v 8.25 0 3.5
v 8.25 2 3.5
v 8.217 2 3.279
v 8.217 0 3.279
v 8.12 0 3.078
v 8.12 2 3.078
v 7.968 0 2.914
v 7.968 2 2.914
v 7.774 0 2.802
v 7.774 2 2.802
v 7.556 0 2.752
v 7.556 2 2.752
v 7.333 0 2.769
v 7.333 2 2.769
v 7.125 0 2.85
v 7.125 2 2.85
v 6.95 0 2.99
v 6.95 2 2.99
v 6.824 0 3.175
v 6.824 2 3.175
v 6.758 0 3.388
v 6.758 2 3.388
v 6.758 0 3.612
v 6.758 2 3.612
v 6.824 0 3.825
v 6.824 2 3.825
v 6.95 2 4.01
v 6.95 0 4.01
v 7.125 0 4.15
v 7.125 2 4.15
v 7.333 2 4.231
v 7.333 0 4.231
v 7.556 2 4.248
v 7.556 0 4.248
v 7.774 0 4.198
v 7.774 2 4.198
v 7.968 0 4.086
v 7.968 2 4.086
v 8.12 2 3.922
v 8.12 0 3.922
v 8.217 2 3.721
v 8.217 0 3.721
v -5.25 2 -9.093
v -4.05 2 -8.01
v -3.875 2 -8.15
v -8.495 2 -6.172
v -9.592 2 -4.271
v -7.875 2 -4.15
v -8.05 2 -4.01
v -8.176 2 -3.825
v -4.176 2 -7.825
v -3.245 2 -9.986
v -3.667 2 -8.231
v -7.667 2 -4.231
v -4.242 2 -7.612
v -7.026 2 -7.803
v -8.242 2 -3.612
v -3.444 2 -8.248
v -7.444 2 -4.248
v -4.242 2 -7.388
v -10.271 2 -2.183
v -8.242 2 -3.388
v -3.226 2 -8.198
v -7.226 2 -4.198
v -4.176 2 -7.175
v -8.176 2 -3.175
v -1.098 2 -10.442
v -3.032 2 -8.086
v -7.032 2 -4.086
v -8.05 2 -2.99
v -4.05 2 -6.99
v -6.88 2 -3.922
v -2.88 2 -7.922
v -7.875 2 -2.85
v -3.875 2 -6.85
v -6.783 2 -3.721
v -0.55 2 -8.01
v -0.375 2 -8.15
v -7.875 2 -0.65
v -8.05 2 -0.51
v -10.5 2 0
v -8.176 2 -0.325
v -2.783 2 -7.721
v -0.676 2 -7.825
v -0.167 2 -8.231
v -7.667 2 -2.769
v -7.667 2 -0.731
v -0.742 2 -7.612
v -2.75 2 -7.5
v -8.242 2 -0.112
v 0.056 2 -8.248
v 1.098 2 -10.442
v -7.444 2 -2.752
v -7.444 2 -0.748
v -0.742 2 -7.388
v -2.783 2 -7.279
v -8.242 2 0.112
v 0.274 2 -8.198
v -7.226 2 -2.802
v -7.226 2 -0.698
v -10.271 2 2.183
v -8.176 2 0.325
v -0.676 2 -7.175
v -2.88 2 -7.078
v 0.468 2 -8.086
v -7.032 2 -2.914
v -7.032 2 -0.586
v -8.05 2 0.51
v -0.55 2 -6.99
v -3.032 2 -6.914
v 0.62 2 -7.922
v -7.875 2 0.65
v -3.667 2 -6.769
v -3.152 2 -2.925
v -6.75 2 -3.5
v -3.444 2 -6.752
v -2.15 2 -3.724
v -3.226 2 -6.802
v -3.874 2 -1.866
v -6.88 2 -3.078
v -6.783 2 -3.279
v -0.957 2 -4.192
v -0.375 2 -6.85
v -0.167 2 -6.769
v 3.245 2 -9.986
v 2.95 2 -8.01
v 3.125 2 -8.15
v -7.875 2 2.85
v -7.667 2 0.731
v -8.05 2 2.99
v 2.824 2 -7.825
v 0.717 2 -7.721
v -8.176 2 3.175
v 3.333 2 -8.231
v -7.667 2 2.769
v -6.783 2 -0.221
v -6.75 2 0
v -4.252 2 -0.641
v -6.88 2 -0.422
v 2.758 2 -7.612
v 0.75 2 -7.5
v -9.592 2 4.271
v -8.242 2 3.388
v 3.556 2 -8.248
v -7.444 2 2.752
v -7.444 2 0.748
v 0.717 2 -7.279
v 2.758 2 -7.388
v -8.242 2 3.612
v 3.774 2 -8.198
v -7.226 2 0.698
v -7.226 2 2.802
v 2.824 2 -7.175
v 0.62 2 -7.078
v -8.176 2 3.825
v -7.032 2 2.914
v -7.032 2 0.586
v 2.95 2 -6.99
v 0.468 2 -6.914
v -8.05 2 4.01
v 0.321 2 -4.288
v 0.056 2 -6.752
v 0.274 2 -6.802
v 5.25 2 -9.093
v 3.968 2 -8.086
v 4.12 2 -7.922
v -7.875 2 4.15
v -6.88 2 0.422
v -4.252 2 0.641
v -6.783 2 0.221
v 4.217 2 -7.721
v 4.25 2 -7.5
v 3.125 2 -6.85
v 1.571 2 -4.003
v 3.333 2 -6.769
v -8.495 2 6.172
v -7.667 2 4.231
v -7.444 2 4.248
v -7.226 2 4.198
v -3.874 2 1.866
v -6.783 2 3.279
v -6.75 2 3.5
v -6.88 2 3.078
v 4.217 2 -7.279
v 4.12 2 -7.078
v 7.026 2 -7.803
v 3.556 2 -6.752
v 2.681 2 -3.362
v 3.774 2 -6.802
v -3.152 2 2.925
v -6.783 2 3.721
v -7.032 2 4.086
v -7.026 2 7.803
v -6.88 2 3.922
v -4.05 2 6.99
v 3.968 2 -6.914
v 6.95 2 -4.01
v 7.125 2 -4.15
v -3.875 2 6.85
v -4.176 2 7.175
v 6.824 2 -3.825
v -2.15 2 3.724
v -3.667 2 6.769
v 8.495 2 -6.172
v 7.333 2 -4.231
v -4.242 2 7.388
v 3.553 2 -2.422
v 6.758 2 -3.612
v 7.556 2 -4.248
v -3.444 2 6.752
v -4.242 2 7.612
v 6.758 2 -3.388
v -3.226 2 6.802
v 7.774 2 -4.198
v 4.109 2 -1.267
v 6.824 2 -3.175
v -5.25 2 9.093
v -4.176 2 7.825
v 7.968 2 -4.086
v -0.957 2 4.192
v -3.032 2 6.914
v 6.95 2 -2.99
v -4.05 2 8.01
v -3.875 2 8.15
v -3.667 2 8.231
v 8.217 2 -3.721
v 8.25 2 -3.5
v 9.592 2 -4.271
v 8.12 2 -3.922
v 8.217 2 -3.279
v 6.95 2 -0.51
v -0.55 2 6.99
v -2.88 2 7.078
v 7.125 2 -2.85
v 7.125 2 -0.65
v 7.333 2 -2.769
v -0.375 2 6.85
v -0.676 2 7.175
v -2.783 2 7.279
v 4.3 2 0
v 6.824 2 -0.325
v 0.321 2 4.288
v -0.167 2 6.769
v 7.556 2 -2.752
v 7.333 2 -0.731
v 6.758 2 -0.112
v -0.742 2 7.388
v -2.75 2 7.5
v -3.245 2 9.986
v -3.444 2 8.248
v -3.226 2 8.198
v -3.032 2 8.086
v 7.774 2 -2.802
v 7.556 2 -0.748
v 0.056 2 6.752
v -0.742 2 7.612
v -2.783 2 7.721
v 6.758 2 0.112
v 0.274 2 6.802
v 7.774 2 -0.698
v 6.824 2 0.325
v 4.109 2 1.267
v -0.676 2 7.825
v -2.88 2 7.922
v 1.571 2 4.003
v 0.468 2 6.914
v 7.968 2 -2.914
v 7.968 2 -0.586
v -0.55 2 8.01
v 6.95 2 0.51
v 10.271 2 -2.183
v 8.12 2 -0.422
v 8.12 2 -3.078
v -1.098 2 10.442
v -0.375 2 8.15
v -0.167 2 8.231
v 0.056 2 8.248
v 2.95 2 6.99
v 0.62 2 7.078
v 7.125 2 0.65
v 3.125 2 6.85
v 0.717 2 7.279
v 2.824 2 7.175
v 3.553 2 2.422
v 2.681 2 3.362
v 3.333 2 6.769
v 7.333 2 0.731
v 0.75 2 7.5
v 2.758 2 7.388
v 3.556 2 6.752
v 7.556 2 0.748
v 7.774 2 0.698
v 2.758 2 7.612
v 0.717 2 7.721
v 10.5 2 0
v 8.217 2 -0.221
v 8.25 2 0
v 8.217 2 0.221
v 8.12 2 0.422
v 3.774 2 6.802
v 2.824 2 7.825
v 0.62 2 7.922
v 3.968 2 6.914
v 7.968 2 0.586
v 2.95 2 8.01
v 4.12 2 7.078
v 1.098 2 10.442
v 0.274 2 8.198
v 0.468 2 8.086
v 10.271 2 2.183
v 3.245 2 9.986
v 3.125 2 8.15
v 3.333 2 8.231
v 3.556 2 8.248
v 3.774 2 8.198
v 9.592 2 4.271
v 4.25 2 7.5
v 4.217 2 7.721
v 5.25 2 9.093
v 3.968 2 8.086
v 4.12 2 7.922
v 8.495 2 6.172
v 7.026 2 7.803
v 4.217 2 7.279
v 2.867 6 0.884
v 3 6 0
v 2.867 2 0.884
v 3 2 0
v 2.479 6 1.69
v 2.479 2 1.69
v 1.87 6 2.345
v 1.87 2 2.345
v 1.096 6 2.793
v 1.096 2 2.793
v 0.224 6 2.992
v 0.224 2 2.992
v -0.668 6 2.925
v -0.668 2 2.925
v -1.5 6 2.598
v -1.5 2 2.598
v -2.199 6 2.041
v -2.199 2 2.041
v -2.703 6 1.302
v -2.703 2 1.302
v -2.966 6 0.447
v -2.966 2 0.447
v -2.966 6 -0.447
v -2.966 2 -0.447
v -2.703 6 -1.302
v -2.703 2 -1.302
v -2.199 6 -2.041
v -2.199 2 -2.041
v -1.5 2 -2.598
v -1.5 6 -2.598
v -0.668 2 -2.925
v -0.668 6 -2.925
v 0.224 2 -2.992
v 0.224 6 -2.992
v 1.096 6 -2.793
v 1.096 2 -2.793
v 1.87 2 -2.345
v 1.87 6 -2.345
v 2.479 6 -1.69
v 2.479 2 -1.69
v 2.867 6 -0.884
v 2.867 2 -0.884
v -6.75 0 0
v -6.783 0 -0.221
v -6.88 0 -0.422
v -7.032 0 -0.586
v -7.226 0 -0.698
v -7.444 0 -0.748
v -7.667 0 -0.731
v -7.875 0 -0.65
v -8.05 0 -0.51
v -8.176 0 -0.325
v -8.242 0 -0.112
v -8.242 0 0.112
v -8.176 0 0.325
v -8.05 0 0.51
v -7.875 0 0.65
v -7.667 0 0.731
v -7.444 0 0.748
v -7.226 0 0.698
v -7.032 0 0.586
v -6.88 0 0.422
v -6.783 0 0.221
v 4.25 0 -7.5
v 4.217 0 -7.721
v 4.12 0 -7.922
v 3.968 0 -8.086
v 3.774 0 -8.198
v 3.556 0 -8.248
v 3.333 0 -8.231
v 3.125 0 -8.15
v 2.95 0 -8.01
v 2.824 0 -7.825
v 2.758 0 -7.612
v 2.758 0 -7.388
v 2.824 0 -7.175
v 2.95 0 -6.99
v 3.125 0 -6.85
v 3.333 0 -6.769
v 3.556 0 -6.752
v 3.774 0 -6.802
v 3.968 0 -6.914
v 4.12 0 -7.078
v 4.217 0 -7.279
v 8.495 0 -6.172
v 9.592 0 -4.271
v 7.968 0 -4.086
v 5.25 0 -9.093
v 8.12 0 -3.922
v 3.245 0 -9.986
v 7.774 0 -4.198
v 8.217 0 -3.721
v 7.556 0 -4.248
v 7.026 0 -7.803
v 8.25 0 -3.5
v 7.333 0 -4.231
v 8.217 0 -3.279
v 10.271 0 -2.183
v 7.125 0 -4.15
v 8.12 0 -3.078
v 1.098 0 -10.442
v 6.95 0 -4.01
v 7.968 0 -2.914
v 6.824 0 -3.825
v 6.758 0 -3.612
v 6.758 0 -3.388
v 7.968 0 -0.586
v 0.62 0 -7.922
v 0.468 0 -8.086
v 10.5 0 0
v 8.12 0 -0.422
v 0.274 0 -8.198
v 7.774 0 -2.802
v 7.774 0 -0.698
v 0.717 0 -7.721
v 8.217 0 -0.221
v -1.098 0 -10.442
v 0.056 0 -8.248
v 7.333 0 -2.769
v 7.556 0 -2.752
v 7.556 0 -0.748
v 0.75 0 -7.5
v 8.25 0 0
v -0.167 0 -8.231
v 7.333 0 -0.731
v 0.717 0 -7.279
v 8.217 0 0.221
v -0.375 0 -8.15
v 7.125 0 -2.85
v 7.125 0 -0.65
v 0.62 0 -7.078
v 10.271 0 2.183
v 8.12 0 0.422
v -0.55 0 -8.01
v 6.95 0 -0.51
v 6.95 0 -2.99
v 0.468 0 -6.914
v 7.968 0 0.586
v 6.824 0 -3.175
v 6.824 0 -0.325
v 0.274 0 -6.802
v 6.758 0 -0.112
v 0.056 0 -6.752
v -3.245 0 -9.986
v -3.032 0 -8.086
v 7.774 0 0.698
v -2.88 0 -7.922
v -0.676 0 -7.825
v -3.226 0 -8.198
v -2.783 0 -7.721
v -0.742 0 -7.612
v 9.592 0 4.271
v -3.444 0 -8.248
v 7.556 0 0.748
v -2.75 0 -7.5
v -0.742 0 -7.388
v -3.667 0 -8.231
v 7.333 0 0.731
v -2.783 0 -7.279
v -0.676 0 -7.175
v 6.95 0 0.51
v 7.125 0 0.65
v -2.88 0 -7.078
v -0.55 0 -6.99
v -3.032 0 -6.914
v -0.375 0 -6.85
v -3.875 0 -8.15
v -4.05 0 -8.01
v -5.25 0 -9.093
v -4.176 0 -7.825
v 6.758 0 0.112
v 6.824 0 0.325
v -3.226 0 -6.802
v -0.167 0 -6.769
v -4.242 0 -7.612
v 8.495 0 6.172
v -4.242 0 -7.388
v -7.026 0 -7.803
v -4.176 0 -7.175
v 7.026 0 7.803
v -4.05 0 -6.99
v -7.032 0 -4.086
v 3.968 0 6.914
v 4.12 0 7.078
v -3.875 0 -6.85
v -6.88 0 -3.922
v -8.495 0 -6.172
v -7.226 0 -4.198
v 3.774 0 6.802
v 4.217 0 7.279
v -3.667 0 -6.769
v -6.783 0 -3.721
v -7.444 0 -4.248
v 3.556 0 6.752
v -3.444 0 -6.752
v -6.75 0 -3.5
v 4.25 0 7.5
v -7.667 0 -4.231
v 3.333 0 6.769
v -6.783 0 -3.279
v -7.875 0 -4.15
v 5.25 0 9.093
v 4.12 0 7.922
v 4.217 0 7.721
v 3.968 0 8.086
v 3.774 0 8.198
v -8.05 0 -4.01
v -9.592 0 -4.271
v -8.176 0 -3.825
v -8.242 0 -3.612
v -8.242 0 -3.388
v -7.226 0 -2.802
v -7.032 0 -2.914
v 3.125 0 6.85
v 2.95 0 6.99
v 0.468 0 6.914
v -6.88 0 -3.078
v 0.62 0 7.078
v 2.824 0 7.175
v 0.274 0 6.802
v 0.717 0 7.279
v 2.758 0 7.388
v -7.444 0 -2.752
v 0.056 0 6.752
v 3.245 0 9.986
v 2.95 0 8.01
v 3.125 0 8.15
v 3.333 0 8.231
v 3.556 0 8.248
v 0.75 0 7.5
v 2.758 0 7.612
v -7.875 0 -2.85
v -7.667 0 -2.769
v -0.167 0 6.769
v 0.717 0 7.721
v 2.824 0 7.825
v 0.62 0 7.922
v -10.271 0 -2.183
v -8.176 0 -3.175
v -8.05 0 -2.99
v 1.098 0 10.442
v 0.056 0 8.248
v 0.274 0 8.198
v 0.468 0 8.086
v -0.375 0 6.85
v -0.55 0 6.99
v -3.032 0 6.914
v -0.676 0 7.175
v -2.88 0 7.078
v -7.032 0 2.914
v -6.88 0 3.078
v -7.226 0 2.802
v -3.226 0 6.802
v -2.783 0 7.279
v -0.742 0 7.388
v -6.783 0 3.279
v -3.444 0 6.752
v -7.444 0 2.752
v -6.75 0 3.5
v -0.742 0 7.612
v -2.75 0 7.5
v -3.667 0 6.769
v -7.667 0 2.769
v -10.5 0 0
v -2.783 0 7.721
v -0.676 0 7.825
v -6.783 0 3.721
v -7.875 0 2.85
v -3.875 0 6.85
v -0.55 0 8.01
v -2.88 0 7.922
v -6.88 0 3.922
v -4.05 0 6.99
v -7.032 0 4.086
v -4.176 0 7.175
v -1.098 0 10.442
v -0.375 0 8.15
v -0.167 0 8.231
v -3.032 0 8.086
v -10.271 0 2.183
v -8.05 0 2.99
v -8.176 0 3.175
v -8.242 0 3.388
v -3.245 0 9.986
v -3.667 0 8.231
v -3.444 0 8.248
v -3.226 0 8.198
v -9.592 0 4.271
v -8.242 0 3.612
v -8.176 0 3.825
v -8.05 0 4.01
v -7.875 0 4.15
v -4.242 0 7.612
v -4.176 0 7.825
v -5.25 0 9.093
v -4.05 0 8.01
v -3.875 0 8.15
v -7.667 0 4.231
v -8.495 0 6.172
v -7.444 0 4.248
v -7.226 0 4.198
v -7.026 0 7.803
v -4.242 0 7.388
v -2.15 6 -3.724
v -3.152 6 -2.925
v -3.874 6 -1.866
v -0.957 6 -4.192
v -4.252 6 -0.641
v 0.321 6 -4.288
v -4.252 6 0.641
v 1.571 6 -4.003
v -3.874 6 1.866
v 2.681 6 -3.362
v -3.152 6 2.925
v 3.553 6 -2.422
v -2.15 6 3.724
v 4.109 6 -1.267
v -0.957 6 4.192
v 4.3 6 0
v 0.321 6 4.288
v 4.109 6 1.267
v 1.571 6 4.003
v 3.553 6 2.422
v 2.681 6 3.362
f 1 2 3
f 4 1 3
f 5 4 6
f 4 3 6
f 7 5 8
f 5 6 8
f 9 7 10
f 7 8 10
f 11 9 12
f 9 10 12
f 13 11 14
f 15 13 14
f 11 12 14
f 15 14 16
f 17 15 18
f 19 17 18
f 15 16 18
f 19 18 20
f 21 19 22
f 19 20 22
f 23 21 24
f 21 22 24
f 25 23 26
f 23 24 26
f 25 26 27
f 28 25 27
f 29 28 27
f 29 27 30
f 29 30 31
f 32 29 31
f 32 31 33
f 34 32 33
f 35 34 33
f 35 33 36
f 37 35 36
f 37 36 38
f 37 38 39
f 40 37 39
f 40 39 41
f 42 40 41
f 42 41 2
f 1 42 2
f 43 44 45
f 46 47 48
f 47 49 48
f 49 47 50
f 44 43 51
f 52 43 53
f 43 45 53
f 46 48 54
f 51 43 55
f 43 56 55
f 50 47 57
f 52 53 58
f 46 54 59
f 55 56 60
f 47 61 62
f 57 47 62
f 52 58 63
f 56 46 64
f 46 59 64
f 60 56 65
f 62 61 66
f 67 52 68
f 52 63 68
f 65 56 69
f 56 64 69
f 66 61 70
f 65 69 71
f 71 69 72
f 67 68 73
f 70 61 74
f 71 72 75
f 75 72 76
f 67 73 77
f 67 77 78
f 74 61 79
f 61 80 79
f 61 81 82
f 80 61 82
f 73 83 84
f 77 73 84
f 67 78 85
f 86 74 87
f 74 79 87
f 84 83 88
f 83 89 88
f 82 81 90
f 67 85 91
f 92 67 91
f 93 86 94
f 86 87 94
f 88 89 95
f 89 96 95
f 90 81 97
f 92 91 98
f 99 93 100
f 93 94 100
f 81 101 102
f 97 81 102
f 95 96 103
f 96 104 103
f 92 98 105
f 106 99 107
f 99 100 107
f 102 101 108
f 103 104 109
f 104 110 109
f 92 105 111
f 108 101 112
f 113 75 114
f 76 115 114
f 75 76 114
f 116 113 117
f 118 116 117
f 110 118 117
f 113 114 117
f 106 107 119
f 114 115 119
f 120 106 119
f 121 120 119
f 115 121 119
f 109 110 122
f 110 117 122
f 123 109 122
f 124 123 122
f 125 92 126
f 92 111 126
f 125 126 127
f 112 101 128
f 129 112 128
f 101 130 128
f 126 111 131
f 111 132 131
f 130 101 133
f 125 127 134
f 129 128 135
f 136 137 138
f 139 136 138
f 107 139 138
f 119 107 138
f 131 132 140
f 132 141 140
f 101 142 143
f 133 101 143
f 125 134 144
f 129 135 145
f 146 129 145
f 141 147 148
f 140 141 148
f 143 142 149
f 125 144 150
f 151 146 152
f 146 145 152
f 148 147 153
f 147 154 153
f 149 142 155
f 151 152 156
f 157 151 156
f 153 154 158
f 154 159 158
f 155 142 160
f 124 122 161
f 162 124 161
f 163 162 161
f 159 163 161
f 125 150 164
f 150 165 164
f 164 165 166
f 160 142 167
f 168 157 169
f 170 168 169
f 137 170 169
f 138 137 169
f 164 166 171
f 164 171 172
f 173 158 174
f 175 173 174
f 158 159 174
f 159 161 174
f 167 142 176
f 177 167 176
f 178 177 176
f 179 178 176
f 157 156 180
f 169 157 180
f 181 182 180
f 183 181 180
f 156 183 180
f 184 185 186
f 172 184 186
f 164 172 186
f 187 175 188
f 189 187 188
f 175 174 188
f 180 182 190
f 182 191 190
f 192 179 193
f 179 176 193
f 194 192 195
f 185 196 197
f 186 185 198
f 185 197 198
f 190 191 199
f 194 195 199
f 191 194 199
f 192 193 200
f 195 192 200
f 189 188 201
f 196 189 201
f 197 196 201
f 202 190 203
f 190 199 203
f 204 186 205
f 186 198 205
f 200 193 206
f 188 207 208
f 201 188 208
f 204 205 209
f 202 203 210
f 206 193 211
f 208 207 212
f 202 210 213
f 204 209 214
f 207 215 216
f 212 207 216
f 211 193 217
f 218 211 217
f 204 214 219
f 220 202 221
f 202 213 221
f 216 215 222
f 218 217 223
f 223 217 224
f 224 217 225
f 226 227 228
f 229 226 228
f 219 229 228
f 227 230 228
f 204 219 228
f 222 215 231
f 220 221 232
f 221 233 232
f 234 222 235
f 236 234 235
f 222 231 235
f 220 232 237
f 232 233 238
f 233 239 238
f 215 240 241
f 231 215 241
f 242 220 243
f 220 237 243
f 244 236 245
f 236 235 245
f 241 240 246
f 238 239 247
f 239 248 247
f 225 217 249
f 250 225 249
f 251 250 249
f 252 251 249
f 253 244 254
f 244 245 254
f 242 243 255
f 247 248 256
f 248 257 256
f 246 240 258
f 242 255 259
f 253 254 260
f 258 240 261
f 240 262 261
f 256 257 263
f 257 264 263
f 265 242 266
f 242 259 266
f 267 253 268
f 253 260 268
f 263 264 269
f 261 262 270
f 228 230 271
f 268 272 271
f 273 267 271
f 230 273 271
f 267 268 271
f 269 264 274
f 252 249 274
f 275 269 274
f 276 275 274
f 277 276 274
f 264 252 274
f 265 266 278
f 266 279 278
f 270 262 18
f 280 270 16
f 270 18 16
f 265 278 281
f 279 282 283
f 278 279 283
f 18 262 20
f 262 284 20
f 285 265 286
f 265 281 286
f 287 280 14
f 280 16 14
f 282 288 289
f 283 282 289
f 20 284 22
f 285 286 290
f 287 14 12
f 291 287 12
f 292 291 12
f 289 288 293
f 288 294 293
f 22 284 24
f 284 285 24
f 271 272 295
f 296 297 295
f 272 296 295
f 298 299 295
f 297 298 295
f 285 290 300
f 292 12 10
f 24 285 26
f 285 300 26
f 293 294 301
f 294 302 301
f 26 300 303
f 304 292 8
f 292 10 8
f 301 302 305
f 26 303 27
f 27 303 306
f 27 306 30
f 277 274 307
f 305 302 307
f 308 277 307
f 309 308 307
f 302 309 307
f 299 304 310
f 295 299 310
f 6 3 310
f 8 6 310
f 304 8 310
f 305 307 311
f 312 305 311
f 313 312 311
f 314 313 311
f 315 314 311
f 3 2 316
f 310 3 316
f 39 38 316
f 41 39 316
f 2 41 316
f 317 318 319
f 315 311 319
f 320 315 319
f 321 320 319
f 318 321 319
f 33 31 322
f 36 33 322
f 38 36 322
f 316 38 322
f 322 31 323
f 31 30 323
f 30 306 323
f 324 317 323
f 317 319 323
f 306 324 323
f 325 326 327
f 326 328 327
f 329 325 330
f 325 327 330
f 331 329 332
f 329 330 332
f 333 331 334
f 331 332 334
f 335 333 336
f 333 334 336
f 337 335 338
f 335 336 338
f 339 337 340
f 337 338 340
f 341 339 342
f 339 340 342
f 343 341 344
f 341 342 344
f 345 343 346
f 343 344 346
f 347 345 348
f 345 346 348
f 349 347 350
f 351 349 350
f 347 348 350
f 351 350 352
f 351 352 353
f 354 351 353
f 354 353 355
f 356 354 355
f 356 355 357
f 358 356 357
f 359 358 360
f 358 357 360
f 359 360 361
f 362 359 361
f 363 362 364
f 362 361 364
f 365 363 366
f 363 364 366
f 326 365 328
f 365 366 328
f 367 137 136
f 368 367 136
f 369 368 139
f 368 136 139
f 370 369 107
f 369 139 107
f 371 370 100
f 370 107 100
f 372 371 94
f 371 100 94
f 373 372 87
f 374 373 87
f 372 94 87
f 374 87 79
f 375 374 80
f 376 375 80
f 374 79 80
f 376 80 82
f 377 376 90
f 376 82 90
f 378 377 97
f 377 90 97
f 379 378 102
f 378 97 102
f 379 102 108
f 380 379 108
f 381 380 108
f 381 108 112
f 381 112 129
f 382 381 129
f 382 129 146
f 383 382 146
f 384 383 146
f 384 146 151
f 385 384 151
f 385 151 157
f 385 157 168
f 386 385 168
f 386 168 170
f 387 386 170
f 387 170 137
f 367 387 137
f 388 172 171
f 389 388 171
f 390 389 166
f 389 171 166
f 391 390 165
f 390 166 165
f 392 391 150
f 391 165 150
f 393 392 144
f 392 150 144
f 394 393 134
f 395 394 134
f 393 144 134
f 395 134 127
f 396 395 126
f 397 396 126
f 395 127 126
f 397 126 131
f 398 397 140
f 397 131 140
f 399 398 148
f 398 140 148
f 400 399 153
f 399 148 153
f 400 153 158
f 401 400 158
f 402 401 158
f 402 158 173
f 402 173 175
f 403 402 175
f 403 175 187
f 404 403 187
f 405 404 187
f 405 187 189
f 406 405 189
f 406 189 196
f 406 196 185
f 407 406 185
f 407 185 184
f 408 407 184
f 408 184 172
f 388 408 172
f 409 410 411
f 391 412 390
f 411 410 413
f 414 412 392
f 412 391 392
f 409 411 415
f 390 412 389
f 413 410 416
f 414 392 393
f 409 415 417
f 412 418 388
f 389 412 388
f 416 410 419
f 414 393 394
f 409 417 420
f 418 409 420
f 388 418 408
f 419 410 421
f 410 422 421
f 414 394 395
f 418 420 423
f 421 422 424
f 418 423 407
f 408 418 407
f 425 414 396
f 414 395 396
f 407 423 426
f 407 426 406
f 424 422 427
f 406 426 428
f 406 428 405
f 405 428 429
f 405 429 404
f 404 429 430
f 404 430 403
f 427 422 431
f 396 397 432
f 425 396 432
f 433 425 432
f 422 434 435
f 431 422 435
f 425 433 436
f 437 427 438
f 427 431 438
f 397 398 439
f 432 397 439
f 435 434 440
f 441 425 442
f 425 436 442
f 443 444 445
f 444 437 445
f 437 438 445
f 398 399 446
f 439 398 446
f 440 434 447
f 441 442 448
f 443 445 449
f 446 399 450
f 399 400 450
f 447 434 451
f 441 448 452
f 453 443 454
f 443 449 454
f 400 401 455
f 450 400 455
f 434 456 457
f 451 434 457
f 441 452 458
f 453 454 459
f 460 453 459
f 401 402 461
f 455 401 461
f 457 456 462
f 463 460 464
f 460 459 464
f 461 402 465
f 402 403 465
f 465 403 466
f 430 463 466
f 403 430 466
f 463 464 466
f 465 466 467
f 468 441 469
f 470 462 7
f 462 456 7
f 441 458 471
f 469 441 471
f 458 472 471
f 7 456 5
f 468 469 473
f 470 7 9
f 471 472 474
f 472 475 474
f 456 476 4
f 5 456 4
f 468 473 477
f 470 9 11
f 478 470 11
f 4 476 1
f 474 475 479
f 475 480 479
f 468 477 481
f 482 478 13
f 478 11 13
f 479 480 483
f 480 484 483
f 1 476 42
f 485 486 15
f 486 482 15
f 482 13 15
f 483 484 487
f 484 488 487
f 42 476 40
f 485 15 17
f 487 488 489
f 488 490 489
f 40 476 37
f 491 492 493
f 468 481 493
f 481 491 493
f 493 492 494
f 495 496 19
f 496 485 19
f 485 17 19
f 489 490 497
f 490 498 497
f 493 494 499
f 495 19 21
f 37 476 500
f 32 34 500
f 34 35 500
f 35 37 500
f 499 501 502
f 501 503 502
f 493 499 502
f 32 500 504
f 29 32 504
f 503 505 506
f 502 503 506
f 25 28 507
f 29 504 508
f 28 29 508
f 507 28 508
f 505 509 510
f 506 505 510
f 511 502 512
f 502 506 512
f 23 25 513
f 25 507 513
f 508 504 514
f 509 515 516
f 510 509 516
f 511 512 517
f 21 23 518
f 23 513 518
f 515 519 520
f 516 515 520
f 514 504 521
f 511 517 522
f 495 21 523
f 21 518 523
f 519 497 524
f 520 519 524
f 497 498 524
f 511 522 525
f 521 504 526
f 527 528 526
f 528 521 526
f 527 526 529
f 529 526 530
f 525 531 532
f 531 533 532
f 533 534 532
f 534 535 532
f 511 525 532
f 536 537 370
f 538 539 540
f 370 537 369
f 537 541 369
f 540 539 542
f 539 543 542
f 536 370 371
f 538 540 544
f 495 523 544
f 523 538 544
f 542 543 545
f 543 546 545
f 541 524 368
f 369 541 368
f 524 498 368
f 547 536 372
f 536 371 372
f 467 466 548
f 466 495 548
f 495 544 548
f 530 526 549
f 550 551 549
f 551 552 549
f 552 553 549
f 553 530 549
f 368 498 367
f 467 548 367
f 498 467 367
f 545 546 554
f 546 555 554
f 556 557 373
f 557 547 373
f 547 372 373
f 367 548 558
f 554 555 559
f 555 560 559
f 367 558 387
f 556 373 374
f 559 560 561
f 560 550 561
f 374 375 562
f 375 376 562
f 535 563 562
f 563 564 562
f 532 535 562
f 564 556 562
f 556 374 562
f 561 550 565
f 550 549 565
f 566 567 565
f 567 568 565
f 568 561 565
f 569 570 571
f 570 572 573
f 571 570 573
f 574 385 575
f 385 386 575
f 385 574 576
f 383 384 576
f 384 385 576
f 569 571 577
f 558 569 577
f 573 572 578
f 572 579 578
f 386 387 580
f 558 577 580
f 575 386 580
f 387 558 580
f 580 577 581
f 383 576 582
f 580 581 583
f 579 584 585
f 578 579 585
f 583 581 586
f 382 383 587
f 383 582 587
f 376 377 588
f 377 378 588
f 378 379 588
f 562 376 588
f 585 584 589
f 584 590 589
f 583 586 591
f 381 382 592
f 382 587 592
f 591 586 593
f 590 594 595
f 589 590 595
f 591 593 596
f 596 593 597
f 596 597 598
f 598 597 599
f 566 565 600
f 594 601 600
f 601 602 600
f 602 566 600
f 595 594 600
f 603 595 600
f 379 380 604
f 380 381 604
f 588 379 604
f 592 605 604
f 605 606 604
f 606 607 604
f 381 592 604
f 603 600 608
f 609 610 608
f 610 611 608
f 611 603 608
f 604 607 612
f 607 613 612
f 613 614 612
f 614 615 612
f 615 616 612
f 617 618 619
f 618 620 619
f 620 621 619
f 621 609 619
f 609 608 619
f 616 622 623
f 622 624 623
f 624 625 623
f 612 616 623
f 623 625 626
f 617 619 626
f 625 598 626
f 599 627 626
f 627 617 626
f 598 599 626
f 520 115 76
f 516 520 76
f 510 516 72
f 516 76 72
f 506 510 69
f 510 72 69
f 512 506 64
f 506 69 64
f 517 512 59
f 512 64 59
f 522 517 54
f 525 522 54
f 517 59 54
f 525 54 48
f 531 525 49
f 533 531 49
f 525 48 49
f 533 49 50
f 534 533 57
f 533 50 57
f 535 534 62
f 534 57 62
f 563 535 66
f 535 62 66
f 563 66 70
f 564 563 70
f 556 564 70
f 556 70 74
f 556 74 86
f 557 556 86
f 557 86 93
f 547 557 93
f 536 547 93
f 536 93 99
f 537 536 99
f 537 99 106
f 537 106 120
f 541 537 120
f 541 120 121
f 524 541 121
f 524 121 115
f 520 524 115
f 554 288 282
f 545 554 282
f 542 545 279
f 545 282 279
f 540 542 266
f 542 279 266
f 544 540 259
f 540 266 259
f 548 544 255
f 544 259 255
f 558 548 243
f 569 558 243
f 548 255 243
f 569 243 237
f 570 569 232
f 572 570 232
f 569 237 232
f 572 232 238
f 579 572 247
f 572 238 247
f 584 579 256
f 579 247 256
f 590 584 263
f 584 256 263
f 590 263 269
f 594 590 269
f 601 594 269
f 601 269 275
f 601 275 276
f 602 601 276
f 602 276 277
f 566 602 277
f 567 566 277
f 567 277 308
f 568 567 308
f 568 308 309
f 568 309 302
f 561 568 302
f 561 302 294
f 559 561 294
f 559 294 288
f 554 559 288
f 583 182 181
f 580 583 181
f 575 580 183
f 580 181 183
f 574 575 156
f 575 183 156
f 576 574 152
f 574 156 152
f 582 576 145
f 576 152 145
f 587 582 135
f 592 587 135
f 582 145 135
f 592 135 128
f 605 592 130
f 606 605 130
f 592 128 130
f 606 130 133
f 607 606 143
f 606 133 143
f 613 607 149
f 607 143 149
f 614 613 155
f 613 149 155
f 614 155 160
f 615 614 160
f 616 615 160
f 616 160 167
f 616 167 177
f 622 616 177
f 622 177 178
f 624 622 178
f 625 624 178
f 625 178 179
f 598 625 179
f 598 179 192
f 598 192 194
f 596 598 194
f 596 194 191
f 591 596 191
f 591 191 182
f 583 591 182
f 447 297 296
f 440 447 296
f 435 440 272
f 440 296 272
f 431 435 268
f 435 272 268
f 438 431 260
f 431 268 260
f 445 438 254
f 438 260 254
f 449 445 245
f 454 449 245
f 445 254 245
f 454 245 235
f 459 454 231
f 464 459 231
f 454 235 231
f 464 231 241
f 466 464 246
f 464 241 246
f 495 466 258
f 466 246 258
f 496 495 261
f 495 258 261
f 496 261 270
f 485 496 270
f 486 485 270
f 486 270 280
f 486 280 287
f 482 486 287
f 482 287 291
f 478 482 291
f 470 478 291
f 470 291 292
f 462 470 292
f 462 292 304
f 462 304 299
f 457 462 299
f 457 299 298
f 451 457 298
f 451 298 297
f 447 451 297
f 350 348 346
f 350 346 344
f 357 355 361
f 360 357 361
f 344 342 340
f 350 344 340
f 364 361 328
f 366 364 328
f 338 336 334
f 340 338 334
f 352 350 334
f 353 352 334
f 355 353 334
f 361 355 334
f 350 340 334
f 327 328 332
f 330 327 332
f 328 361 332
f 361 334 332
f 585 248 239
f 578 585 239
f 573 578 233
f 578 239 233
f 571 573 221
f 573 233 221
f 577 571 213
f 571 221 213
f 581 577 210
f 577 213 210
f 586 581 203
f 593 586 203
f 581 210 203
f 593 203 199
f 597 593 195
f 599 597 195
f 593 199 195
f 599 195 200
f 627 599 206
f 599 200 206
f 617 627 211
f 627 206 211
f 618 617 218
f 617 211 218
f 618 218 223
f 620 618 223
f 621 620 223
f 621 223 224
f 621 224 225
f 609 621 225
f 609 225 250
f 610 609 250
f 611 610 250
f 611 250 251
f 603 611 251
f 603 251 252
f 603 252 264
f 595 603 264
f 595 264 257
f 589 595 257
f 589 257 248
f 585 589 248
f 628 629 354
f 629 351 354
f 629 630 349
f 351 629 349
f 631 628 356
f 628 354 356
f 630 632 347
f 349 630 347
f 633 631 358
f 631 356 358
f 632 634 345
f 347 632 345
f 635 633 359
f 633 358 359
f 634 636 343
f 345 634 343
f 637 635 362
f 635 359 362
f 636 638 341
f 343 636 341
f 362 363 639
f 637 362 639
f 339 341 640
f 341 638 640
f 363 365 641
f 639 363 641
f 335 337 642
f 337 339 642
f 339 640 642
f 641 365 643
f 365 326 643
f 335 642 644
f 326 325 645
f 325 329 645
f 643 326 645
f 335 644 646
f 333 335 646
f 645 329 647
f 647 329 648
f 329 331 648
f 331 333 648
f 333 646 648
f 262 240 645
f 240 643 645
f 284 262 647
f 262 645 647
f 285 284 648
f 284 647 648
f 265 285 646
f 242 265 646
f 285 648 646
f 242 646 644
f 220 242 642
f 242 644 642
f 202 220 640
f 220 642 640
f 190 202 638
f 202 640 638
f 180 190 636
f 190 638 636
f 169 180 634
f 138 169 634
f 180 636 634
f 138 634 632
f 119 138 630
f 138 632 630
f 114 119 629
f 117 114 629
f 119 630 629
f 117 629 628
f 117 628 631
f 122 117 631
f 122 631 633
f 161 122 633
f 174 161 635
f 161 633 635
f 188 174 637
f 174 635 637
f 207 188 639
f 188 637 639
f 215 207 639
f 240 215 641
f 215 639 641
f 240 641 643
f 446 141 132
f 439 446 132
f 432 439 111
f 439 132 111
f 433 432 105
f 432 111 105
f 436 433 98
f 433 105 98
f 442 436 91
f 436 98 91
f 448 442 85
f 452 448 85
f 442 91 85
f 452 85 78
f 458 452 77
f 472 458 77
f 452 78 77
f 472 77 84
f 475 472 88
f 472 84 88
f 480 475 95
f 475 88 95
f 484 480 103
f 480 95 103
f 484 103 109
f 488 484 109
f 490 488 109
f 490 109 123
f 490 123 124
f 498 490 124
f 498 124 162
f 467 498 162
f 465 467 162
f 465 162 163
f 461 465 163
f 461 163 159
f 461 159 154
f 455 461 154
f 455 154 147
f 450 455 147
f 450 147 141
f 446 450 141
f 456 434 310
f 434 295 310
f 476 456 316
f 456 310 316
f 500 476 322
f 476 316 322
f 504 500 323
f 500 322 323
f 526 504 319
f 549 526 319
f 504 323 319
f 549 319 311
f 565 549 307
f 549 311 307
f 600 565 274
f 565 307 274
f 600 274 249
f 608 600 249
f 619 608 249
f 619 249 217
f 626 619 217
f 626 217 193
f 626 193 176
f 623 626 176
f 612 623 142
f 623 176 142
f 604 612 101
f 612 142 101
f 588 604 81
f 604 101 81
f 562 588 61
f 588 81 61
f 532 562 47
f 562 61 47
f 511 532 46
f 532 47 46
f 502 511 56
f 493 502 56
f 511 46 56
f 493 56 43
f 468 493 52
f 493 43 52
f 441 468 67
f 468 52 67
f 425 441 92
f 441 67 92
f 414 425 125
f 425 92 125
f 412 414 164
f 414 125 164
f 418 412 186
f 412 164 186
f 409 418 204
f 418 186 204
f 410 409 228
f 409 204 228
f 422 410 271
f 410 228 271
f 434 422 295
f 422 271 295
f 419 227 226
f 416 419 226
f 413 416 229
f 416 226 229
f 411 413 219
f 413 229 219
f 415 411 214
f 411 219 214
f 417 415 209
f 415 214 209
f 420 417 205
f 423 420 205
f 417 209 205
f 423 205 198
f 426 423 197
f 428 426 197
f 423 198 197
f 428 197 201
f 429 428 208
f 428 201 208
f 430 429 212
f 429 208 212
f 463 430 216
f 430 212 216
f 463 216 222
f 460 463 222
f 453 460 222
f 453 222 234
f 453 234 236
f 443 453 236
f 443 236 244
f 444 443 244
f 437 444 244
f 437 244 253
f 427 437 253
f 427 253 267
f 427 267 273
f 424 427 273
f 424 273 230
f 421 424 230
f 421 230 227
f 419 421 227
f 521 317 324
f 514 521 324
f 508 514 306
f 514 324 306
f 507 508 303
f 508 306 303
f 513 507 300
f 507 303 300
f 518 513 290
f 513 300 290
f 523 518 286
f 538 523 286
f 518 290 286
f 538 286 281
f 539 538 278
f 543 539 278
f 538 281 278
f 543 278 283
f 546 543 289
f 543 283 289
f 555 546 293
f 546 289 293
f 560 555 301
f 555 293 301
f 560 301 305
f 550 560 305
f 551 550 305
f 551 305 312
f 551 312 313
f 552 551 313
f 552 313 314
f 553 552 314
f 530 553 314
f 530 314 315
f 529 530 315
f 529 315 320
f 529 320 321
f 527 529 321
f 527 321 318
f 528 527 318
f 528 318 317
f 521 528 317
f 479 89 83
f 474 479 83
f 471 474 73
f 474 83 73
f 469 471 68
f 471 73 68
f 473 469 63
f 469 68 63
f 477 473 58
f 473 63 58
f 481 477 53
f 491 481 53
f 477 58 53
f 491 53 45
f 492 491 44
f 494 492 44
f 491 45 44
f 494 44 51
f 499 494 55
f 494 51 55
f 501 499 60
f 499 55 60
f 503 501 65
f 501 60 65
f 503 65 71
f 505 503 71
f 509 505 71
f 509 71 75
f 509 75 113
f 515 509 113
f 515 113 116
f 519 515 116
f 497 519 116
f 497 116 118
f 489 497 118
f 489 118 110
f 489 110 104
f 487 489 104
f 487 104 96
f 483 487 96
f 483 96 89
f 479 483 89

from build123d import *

# Parameters (mm, degrees)
CUT_EXTRUDE_1_REACH = 4
SKETCH_2_R          = 0.75


with BuildPart() as part:
    # 草图1 → 旋转1 (revolve)
    with BuildSketch(Plane.XY):
        Polygon((0, 0), (10.5, 0), (10.5, 2), (4.3, 2), (4.3, 6), (3, 6), (3, 2), (0, 2), align=None)
    revolve(axis=Axis((0, 2, 0), (0, -1, 0)))

    # 草图2 → 切除-拉伸1 (cut, up to next)
    with BuildSketch(Plane(origin=(0, 2, 0), x_dir=(1, 0, 0), z_dir=(0, 1, 0)), mode=Mode.PRIVATE) as cut_extrude_1_sk1:
        with Locations((3.5, 7.5)):
            Circle(SKETCH_2_R)
    cut_extrude_1_tool1 = extrude(cut_extrude_1_sk1.sketch, amount=-CUT_EXTRUDE_1_REACH, mode=Mode.PRIVATE) & part.part
    add(cut_extrude_1_tool1.solids().sort_by_distance((3.5, 2, -7.5))[0], mode=Mode.SUBTRACT)
    # 草图2 → 切除-拉伸1 (cut, up to next)
    with BuildSketch(Plane(origin=(0, 2, 0), x_dir=(1, 0, 0), z_dir=(0, 1, 0)), mode=Mode.PRIVATE) as cut_extrude_1_sk2:
        with Locations((0, 7.5)):
            Circle(SKETCH_2_R)
    cut_extrude_1_tool2 = extrude(cut_extrude_1_sk2.sketch, amount=-CUT_EXTRUDE_1_REACH, mode=Mode.PRIVATE) & part.part
    add(cut_extrude_1_tool2.solids().sort_by_distance((0, 2, -7.5))[0], mode=Mode.SUBTRACT)
    # 草图2 → 切除-拉伸1 (cut, up to next)
    with BuildSketch(Plane(origin=(0, 2, 0), x_dir=(1, 0, 0), z_dir=(0, 1, 0)), mode=Mode.PRIVATE) as cut_extrude_1_sk3:
        with Locations((-3.5, 7.5)):
            Circle(SKETCH_2_R)
    cut_extrude_1_tool3 = extrude(cut_extrude_1_sk3.sketch, amount=-CUT_EXTRUDE_1_REACH, mode=Mode.PRIVATE) & part.part
    add(cut_extrude_1_tool3.solids().sort_by_distance((-3.5, 2, -7.5))[0], mode=Mode.SUBTRACT)
    # 草图2 → 切除-拉伸1 (cut, up to next)
    with BuildSketch(Plane(origin=(0, 2, 0), x_dir=(1, 0, 0), z_dir=(0, 1, 0)), mode=Mode.PRIVATE) as cut_extrude_1_sk4:
        with Locations((7.5, 3.5)):
            Circle(SKETCH_2_R)
    cut_extrude_1_tool4 = extrude(cut_extrude_1_sk4.sketch, amount=-CUT_EXTRUDE_1_REACH, mode=Mode.PRIVATE) & part.part
    add(cut_extrude_1_tool4.solids().sort_by_distance((7.5, 2, -3.5))[0], mode=Mode.SUBTRACT)
    # 草图2 → 切除-拉伸1 (cut, up to next)
    with BuildSketch(Plane(origin=(0, 2, 0), x_dir=(1, 0, 0), z_dir=(0, 1, 0)), mode=Mode.PRIVATE) as cut_extrude_1_sk5:
        with Locations((7.5, -3.5)):
            Circle(SKETCH_2_R)
    cut_extrude_1_tool5 = extrude(cut_extrude_1_sk5.sketch, amount=-CUT_EXTRUDE_1_REACH, mode=Mode.PRIVATE) & part.part
    add(cut_extrude_1_tool5.solids().sort_by_distance((7.5, 2, 3.5))[0], mode=Mode.SUBTRACT)
    # 草图2 → 切除-拉伸1 (cut, up to next)
    with BuildSketch(Plane(origin=(0, 2, 0), x_dir=(1, 0, 0), z_dir=(0, 1, 0)), mode=Mode.PRIVATE) as cut_extrude_1_sk6:
        with Locations((7.5, 0)):
            Circle(SKETCH_2_R)
    cut_extrude_1_tool6 = extrude(cut_extrude_1_sk6.sketch, amount=-CUT_EXTRUDE_1_REACH, mode=Mode.PRIVATE) & part.part
    add(cut_extrude_1_tool6.solids().sort_by_distance((7.5, 2, 0))[0], mode=Mode.SUBTRACT)
    # 草图2 → 切除-拉伸1 (cut, up to next)
    with BuildSketch(Plane(origin=(0, 2, 0), x_dir=(1, 0, 0), z_dir=(0, 1, 0)), mode=Mode.PRIVATE) as cut_extrude_1_sk7:
        with Locations((3.5, -7.5)):
            Circle(SKETCH_2_R)
    cut_extrude_1_tool7 = extrude(cut_extrude_1_sk7.sketch, amount=-CUT_EXTRUDE_1_REACH, mode=Mode.PRIVATE) & part.part
    add(cut_extrude_1_tool7.solids().sort_by_distance((3.5, 2, 7.5))[0], mode=Mode.SUBTRACT)
    # 草图2 → 切除-拉伸1 (cut, up to next)
    with BuildSketch(Plane(origin=(0, 2, 0), x_dir=(1, 0, 0), z_dir=(0, 1, 0)), mode=Mode.PRIVATE) as cut_extrude_1_sk8:
        with Locations((-3.5, -7.5)):
            Circle(SKETCH_2_R)
    cut_extrude_1_tool8 = extrude(cut_extrude_1_sk8.sketch, amount=-CUT_EXTRUDE_1_REACH, mode=Mode.PRIVATE) & part.part
    add(cut_extrude_1_tool8.solids().sort_by_distance((-3.5, 2, 7.5))[0], mode=Mode.SUBTRACT)
    # 草图2 → 切除-拉伸1 (cut, up to next)
    with BuildSketch(Plane(origin=(0, 2, 0), x_dir=(1, 0, 0), z_dir=(0, 1, 0)), mode=Mode.PRIVATE) as cut_extrude_1_sk9:
        with Locations((0, -7.5)):
            Circle(SKETCH_2_R)
    cut_extrude_1_tool9 = extrude(cut_extrude_1_sk9.sketch, amount=-CUT_EXTRUDE_1_REACH, mode=Mode.PRIVATE) & part.part
    add(cut_extrude_1_tool9.solids().sort_by_distance((0, 2, 7.5))[0], mode=Mode.SUBTRACT)
    # 草图2 → 切除-拉伸1 (cut, up to next)
    with BuildSketch(Plane(origin=(0, 2, 0), x_dir=(1, 0, 0), z_dir=(0, 1, 0)), mode=Mode.PRIVATE) as cut_extrude_1_sk10:
        with Locations((-7.5, -3.5)):
            Circle(SKETCH_2_R)
    cut_extrude_1_tool10 = extrude(cut_extrude_1_sk10.sketch, amount=-CUT_EXTRUDE_1_REACH, mode=Mode.PRIVATE) & part.part
    add(cut_extrude_1_tool10.solids().sort_by_distance((-7.5, 2, 3.5))[0], mode=Mode.SUBTRACT)
    # 草图2 → 切除-拉伸1 (cut, up to next)
    with BuildSketch(Plane(origin=(0, 2, 0), x_dir=(1, 0, 0), z_dir=(0, 1, 0)), mode=Mode.PRIVATE) as cut_extrude_1_sk11:
        with Locations((-7.5, 3.5)):
            Circle(SKETCH_2_R)
    cut_extrude_1_tool11 = extrude(cut_extrude_1_sk11.sketch, amount=-CUT_EXTRUDE_1_REACH, mode=Mode.PRIVATE) & part.part
    add(cut_extrude_1_tool11.solids().sort_by_distance((-7.5, 2, -3.5))[0], mode=Mode.SUBTRACT)
    # 草图2 → 切除-拉伸1 (cut, up to next)
    with BuildSketch(Plane(origin=(0, 2, 0), x_dir=(1, 0, 0), z_dir=(0, 1, 0)), mode=Mode.PRIVATE) as cut_extrude_1_sk12:
        with Locations((-7.5, 0)):
            Circle(SKETCH_2_R)
    cut_extrude_1_tool12 = extrude(cut_extrude_1_sk12.sketch, amount=-CUT_EXTRUDE_1_REACH, mode=Mode.PRIVATE) & part.part
    add(cut_extrude_1_tool12.solids().sort_by_distance((-7.5, 2, 0))[0], mode=Mode.SUBTRACT)


solid = part.part
